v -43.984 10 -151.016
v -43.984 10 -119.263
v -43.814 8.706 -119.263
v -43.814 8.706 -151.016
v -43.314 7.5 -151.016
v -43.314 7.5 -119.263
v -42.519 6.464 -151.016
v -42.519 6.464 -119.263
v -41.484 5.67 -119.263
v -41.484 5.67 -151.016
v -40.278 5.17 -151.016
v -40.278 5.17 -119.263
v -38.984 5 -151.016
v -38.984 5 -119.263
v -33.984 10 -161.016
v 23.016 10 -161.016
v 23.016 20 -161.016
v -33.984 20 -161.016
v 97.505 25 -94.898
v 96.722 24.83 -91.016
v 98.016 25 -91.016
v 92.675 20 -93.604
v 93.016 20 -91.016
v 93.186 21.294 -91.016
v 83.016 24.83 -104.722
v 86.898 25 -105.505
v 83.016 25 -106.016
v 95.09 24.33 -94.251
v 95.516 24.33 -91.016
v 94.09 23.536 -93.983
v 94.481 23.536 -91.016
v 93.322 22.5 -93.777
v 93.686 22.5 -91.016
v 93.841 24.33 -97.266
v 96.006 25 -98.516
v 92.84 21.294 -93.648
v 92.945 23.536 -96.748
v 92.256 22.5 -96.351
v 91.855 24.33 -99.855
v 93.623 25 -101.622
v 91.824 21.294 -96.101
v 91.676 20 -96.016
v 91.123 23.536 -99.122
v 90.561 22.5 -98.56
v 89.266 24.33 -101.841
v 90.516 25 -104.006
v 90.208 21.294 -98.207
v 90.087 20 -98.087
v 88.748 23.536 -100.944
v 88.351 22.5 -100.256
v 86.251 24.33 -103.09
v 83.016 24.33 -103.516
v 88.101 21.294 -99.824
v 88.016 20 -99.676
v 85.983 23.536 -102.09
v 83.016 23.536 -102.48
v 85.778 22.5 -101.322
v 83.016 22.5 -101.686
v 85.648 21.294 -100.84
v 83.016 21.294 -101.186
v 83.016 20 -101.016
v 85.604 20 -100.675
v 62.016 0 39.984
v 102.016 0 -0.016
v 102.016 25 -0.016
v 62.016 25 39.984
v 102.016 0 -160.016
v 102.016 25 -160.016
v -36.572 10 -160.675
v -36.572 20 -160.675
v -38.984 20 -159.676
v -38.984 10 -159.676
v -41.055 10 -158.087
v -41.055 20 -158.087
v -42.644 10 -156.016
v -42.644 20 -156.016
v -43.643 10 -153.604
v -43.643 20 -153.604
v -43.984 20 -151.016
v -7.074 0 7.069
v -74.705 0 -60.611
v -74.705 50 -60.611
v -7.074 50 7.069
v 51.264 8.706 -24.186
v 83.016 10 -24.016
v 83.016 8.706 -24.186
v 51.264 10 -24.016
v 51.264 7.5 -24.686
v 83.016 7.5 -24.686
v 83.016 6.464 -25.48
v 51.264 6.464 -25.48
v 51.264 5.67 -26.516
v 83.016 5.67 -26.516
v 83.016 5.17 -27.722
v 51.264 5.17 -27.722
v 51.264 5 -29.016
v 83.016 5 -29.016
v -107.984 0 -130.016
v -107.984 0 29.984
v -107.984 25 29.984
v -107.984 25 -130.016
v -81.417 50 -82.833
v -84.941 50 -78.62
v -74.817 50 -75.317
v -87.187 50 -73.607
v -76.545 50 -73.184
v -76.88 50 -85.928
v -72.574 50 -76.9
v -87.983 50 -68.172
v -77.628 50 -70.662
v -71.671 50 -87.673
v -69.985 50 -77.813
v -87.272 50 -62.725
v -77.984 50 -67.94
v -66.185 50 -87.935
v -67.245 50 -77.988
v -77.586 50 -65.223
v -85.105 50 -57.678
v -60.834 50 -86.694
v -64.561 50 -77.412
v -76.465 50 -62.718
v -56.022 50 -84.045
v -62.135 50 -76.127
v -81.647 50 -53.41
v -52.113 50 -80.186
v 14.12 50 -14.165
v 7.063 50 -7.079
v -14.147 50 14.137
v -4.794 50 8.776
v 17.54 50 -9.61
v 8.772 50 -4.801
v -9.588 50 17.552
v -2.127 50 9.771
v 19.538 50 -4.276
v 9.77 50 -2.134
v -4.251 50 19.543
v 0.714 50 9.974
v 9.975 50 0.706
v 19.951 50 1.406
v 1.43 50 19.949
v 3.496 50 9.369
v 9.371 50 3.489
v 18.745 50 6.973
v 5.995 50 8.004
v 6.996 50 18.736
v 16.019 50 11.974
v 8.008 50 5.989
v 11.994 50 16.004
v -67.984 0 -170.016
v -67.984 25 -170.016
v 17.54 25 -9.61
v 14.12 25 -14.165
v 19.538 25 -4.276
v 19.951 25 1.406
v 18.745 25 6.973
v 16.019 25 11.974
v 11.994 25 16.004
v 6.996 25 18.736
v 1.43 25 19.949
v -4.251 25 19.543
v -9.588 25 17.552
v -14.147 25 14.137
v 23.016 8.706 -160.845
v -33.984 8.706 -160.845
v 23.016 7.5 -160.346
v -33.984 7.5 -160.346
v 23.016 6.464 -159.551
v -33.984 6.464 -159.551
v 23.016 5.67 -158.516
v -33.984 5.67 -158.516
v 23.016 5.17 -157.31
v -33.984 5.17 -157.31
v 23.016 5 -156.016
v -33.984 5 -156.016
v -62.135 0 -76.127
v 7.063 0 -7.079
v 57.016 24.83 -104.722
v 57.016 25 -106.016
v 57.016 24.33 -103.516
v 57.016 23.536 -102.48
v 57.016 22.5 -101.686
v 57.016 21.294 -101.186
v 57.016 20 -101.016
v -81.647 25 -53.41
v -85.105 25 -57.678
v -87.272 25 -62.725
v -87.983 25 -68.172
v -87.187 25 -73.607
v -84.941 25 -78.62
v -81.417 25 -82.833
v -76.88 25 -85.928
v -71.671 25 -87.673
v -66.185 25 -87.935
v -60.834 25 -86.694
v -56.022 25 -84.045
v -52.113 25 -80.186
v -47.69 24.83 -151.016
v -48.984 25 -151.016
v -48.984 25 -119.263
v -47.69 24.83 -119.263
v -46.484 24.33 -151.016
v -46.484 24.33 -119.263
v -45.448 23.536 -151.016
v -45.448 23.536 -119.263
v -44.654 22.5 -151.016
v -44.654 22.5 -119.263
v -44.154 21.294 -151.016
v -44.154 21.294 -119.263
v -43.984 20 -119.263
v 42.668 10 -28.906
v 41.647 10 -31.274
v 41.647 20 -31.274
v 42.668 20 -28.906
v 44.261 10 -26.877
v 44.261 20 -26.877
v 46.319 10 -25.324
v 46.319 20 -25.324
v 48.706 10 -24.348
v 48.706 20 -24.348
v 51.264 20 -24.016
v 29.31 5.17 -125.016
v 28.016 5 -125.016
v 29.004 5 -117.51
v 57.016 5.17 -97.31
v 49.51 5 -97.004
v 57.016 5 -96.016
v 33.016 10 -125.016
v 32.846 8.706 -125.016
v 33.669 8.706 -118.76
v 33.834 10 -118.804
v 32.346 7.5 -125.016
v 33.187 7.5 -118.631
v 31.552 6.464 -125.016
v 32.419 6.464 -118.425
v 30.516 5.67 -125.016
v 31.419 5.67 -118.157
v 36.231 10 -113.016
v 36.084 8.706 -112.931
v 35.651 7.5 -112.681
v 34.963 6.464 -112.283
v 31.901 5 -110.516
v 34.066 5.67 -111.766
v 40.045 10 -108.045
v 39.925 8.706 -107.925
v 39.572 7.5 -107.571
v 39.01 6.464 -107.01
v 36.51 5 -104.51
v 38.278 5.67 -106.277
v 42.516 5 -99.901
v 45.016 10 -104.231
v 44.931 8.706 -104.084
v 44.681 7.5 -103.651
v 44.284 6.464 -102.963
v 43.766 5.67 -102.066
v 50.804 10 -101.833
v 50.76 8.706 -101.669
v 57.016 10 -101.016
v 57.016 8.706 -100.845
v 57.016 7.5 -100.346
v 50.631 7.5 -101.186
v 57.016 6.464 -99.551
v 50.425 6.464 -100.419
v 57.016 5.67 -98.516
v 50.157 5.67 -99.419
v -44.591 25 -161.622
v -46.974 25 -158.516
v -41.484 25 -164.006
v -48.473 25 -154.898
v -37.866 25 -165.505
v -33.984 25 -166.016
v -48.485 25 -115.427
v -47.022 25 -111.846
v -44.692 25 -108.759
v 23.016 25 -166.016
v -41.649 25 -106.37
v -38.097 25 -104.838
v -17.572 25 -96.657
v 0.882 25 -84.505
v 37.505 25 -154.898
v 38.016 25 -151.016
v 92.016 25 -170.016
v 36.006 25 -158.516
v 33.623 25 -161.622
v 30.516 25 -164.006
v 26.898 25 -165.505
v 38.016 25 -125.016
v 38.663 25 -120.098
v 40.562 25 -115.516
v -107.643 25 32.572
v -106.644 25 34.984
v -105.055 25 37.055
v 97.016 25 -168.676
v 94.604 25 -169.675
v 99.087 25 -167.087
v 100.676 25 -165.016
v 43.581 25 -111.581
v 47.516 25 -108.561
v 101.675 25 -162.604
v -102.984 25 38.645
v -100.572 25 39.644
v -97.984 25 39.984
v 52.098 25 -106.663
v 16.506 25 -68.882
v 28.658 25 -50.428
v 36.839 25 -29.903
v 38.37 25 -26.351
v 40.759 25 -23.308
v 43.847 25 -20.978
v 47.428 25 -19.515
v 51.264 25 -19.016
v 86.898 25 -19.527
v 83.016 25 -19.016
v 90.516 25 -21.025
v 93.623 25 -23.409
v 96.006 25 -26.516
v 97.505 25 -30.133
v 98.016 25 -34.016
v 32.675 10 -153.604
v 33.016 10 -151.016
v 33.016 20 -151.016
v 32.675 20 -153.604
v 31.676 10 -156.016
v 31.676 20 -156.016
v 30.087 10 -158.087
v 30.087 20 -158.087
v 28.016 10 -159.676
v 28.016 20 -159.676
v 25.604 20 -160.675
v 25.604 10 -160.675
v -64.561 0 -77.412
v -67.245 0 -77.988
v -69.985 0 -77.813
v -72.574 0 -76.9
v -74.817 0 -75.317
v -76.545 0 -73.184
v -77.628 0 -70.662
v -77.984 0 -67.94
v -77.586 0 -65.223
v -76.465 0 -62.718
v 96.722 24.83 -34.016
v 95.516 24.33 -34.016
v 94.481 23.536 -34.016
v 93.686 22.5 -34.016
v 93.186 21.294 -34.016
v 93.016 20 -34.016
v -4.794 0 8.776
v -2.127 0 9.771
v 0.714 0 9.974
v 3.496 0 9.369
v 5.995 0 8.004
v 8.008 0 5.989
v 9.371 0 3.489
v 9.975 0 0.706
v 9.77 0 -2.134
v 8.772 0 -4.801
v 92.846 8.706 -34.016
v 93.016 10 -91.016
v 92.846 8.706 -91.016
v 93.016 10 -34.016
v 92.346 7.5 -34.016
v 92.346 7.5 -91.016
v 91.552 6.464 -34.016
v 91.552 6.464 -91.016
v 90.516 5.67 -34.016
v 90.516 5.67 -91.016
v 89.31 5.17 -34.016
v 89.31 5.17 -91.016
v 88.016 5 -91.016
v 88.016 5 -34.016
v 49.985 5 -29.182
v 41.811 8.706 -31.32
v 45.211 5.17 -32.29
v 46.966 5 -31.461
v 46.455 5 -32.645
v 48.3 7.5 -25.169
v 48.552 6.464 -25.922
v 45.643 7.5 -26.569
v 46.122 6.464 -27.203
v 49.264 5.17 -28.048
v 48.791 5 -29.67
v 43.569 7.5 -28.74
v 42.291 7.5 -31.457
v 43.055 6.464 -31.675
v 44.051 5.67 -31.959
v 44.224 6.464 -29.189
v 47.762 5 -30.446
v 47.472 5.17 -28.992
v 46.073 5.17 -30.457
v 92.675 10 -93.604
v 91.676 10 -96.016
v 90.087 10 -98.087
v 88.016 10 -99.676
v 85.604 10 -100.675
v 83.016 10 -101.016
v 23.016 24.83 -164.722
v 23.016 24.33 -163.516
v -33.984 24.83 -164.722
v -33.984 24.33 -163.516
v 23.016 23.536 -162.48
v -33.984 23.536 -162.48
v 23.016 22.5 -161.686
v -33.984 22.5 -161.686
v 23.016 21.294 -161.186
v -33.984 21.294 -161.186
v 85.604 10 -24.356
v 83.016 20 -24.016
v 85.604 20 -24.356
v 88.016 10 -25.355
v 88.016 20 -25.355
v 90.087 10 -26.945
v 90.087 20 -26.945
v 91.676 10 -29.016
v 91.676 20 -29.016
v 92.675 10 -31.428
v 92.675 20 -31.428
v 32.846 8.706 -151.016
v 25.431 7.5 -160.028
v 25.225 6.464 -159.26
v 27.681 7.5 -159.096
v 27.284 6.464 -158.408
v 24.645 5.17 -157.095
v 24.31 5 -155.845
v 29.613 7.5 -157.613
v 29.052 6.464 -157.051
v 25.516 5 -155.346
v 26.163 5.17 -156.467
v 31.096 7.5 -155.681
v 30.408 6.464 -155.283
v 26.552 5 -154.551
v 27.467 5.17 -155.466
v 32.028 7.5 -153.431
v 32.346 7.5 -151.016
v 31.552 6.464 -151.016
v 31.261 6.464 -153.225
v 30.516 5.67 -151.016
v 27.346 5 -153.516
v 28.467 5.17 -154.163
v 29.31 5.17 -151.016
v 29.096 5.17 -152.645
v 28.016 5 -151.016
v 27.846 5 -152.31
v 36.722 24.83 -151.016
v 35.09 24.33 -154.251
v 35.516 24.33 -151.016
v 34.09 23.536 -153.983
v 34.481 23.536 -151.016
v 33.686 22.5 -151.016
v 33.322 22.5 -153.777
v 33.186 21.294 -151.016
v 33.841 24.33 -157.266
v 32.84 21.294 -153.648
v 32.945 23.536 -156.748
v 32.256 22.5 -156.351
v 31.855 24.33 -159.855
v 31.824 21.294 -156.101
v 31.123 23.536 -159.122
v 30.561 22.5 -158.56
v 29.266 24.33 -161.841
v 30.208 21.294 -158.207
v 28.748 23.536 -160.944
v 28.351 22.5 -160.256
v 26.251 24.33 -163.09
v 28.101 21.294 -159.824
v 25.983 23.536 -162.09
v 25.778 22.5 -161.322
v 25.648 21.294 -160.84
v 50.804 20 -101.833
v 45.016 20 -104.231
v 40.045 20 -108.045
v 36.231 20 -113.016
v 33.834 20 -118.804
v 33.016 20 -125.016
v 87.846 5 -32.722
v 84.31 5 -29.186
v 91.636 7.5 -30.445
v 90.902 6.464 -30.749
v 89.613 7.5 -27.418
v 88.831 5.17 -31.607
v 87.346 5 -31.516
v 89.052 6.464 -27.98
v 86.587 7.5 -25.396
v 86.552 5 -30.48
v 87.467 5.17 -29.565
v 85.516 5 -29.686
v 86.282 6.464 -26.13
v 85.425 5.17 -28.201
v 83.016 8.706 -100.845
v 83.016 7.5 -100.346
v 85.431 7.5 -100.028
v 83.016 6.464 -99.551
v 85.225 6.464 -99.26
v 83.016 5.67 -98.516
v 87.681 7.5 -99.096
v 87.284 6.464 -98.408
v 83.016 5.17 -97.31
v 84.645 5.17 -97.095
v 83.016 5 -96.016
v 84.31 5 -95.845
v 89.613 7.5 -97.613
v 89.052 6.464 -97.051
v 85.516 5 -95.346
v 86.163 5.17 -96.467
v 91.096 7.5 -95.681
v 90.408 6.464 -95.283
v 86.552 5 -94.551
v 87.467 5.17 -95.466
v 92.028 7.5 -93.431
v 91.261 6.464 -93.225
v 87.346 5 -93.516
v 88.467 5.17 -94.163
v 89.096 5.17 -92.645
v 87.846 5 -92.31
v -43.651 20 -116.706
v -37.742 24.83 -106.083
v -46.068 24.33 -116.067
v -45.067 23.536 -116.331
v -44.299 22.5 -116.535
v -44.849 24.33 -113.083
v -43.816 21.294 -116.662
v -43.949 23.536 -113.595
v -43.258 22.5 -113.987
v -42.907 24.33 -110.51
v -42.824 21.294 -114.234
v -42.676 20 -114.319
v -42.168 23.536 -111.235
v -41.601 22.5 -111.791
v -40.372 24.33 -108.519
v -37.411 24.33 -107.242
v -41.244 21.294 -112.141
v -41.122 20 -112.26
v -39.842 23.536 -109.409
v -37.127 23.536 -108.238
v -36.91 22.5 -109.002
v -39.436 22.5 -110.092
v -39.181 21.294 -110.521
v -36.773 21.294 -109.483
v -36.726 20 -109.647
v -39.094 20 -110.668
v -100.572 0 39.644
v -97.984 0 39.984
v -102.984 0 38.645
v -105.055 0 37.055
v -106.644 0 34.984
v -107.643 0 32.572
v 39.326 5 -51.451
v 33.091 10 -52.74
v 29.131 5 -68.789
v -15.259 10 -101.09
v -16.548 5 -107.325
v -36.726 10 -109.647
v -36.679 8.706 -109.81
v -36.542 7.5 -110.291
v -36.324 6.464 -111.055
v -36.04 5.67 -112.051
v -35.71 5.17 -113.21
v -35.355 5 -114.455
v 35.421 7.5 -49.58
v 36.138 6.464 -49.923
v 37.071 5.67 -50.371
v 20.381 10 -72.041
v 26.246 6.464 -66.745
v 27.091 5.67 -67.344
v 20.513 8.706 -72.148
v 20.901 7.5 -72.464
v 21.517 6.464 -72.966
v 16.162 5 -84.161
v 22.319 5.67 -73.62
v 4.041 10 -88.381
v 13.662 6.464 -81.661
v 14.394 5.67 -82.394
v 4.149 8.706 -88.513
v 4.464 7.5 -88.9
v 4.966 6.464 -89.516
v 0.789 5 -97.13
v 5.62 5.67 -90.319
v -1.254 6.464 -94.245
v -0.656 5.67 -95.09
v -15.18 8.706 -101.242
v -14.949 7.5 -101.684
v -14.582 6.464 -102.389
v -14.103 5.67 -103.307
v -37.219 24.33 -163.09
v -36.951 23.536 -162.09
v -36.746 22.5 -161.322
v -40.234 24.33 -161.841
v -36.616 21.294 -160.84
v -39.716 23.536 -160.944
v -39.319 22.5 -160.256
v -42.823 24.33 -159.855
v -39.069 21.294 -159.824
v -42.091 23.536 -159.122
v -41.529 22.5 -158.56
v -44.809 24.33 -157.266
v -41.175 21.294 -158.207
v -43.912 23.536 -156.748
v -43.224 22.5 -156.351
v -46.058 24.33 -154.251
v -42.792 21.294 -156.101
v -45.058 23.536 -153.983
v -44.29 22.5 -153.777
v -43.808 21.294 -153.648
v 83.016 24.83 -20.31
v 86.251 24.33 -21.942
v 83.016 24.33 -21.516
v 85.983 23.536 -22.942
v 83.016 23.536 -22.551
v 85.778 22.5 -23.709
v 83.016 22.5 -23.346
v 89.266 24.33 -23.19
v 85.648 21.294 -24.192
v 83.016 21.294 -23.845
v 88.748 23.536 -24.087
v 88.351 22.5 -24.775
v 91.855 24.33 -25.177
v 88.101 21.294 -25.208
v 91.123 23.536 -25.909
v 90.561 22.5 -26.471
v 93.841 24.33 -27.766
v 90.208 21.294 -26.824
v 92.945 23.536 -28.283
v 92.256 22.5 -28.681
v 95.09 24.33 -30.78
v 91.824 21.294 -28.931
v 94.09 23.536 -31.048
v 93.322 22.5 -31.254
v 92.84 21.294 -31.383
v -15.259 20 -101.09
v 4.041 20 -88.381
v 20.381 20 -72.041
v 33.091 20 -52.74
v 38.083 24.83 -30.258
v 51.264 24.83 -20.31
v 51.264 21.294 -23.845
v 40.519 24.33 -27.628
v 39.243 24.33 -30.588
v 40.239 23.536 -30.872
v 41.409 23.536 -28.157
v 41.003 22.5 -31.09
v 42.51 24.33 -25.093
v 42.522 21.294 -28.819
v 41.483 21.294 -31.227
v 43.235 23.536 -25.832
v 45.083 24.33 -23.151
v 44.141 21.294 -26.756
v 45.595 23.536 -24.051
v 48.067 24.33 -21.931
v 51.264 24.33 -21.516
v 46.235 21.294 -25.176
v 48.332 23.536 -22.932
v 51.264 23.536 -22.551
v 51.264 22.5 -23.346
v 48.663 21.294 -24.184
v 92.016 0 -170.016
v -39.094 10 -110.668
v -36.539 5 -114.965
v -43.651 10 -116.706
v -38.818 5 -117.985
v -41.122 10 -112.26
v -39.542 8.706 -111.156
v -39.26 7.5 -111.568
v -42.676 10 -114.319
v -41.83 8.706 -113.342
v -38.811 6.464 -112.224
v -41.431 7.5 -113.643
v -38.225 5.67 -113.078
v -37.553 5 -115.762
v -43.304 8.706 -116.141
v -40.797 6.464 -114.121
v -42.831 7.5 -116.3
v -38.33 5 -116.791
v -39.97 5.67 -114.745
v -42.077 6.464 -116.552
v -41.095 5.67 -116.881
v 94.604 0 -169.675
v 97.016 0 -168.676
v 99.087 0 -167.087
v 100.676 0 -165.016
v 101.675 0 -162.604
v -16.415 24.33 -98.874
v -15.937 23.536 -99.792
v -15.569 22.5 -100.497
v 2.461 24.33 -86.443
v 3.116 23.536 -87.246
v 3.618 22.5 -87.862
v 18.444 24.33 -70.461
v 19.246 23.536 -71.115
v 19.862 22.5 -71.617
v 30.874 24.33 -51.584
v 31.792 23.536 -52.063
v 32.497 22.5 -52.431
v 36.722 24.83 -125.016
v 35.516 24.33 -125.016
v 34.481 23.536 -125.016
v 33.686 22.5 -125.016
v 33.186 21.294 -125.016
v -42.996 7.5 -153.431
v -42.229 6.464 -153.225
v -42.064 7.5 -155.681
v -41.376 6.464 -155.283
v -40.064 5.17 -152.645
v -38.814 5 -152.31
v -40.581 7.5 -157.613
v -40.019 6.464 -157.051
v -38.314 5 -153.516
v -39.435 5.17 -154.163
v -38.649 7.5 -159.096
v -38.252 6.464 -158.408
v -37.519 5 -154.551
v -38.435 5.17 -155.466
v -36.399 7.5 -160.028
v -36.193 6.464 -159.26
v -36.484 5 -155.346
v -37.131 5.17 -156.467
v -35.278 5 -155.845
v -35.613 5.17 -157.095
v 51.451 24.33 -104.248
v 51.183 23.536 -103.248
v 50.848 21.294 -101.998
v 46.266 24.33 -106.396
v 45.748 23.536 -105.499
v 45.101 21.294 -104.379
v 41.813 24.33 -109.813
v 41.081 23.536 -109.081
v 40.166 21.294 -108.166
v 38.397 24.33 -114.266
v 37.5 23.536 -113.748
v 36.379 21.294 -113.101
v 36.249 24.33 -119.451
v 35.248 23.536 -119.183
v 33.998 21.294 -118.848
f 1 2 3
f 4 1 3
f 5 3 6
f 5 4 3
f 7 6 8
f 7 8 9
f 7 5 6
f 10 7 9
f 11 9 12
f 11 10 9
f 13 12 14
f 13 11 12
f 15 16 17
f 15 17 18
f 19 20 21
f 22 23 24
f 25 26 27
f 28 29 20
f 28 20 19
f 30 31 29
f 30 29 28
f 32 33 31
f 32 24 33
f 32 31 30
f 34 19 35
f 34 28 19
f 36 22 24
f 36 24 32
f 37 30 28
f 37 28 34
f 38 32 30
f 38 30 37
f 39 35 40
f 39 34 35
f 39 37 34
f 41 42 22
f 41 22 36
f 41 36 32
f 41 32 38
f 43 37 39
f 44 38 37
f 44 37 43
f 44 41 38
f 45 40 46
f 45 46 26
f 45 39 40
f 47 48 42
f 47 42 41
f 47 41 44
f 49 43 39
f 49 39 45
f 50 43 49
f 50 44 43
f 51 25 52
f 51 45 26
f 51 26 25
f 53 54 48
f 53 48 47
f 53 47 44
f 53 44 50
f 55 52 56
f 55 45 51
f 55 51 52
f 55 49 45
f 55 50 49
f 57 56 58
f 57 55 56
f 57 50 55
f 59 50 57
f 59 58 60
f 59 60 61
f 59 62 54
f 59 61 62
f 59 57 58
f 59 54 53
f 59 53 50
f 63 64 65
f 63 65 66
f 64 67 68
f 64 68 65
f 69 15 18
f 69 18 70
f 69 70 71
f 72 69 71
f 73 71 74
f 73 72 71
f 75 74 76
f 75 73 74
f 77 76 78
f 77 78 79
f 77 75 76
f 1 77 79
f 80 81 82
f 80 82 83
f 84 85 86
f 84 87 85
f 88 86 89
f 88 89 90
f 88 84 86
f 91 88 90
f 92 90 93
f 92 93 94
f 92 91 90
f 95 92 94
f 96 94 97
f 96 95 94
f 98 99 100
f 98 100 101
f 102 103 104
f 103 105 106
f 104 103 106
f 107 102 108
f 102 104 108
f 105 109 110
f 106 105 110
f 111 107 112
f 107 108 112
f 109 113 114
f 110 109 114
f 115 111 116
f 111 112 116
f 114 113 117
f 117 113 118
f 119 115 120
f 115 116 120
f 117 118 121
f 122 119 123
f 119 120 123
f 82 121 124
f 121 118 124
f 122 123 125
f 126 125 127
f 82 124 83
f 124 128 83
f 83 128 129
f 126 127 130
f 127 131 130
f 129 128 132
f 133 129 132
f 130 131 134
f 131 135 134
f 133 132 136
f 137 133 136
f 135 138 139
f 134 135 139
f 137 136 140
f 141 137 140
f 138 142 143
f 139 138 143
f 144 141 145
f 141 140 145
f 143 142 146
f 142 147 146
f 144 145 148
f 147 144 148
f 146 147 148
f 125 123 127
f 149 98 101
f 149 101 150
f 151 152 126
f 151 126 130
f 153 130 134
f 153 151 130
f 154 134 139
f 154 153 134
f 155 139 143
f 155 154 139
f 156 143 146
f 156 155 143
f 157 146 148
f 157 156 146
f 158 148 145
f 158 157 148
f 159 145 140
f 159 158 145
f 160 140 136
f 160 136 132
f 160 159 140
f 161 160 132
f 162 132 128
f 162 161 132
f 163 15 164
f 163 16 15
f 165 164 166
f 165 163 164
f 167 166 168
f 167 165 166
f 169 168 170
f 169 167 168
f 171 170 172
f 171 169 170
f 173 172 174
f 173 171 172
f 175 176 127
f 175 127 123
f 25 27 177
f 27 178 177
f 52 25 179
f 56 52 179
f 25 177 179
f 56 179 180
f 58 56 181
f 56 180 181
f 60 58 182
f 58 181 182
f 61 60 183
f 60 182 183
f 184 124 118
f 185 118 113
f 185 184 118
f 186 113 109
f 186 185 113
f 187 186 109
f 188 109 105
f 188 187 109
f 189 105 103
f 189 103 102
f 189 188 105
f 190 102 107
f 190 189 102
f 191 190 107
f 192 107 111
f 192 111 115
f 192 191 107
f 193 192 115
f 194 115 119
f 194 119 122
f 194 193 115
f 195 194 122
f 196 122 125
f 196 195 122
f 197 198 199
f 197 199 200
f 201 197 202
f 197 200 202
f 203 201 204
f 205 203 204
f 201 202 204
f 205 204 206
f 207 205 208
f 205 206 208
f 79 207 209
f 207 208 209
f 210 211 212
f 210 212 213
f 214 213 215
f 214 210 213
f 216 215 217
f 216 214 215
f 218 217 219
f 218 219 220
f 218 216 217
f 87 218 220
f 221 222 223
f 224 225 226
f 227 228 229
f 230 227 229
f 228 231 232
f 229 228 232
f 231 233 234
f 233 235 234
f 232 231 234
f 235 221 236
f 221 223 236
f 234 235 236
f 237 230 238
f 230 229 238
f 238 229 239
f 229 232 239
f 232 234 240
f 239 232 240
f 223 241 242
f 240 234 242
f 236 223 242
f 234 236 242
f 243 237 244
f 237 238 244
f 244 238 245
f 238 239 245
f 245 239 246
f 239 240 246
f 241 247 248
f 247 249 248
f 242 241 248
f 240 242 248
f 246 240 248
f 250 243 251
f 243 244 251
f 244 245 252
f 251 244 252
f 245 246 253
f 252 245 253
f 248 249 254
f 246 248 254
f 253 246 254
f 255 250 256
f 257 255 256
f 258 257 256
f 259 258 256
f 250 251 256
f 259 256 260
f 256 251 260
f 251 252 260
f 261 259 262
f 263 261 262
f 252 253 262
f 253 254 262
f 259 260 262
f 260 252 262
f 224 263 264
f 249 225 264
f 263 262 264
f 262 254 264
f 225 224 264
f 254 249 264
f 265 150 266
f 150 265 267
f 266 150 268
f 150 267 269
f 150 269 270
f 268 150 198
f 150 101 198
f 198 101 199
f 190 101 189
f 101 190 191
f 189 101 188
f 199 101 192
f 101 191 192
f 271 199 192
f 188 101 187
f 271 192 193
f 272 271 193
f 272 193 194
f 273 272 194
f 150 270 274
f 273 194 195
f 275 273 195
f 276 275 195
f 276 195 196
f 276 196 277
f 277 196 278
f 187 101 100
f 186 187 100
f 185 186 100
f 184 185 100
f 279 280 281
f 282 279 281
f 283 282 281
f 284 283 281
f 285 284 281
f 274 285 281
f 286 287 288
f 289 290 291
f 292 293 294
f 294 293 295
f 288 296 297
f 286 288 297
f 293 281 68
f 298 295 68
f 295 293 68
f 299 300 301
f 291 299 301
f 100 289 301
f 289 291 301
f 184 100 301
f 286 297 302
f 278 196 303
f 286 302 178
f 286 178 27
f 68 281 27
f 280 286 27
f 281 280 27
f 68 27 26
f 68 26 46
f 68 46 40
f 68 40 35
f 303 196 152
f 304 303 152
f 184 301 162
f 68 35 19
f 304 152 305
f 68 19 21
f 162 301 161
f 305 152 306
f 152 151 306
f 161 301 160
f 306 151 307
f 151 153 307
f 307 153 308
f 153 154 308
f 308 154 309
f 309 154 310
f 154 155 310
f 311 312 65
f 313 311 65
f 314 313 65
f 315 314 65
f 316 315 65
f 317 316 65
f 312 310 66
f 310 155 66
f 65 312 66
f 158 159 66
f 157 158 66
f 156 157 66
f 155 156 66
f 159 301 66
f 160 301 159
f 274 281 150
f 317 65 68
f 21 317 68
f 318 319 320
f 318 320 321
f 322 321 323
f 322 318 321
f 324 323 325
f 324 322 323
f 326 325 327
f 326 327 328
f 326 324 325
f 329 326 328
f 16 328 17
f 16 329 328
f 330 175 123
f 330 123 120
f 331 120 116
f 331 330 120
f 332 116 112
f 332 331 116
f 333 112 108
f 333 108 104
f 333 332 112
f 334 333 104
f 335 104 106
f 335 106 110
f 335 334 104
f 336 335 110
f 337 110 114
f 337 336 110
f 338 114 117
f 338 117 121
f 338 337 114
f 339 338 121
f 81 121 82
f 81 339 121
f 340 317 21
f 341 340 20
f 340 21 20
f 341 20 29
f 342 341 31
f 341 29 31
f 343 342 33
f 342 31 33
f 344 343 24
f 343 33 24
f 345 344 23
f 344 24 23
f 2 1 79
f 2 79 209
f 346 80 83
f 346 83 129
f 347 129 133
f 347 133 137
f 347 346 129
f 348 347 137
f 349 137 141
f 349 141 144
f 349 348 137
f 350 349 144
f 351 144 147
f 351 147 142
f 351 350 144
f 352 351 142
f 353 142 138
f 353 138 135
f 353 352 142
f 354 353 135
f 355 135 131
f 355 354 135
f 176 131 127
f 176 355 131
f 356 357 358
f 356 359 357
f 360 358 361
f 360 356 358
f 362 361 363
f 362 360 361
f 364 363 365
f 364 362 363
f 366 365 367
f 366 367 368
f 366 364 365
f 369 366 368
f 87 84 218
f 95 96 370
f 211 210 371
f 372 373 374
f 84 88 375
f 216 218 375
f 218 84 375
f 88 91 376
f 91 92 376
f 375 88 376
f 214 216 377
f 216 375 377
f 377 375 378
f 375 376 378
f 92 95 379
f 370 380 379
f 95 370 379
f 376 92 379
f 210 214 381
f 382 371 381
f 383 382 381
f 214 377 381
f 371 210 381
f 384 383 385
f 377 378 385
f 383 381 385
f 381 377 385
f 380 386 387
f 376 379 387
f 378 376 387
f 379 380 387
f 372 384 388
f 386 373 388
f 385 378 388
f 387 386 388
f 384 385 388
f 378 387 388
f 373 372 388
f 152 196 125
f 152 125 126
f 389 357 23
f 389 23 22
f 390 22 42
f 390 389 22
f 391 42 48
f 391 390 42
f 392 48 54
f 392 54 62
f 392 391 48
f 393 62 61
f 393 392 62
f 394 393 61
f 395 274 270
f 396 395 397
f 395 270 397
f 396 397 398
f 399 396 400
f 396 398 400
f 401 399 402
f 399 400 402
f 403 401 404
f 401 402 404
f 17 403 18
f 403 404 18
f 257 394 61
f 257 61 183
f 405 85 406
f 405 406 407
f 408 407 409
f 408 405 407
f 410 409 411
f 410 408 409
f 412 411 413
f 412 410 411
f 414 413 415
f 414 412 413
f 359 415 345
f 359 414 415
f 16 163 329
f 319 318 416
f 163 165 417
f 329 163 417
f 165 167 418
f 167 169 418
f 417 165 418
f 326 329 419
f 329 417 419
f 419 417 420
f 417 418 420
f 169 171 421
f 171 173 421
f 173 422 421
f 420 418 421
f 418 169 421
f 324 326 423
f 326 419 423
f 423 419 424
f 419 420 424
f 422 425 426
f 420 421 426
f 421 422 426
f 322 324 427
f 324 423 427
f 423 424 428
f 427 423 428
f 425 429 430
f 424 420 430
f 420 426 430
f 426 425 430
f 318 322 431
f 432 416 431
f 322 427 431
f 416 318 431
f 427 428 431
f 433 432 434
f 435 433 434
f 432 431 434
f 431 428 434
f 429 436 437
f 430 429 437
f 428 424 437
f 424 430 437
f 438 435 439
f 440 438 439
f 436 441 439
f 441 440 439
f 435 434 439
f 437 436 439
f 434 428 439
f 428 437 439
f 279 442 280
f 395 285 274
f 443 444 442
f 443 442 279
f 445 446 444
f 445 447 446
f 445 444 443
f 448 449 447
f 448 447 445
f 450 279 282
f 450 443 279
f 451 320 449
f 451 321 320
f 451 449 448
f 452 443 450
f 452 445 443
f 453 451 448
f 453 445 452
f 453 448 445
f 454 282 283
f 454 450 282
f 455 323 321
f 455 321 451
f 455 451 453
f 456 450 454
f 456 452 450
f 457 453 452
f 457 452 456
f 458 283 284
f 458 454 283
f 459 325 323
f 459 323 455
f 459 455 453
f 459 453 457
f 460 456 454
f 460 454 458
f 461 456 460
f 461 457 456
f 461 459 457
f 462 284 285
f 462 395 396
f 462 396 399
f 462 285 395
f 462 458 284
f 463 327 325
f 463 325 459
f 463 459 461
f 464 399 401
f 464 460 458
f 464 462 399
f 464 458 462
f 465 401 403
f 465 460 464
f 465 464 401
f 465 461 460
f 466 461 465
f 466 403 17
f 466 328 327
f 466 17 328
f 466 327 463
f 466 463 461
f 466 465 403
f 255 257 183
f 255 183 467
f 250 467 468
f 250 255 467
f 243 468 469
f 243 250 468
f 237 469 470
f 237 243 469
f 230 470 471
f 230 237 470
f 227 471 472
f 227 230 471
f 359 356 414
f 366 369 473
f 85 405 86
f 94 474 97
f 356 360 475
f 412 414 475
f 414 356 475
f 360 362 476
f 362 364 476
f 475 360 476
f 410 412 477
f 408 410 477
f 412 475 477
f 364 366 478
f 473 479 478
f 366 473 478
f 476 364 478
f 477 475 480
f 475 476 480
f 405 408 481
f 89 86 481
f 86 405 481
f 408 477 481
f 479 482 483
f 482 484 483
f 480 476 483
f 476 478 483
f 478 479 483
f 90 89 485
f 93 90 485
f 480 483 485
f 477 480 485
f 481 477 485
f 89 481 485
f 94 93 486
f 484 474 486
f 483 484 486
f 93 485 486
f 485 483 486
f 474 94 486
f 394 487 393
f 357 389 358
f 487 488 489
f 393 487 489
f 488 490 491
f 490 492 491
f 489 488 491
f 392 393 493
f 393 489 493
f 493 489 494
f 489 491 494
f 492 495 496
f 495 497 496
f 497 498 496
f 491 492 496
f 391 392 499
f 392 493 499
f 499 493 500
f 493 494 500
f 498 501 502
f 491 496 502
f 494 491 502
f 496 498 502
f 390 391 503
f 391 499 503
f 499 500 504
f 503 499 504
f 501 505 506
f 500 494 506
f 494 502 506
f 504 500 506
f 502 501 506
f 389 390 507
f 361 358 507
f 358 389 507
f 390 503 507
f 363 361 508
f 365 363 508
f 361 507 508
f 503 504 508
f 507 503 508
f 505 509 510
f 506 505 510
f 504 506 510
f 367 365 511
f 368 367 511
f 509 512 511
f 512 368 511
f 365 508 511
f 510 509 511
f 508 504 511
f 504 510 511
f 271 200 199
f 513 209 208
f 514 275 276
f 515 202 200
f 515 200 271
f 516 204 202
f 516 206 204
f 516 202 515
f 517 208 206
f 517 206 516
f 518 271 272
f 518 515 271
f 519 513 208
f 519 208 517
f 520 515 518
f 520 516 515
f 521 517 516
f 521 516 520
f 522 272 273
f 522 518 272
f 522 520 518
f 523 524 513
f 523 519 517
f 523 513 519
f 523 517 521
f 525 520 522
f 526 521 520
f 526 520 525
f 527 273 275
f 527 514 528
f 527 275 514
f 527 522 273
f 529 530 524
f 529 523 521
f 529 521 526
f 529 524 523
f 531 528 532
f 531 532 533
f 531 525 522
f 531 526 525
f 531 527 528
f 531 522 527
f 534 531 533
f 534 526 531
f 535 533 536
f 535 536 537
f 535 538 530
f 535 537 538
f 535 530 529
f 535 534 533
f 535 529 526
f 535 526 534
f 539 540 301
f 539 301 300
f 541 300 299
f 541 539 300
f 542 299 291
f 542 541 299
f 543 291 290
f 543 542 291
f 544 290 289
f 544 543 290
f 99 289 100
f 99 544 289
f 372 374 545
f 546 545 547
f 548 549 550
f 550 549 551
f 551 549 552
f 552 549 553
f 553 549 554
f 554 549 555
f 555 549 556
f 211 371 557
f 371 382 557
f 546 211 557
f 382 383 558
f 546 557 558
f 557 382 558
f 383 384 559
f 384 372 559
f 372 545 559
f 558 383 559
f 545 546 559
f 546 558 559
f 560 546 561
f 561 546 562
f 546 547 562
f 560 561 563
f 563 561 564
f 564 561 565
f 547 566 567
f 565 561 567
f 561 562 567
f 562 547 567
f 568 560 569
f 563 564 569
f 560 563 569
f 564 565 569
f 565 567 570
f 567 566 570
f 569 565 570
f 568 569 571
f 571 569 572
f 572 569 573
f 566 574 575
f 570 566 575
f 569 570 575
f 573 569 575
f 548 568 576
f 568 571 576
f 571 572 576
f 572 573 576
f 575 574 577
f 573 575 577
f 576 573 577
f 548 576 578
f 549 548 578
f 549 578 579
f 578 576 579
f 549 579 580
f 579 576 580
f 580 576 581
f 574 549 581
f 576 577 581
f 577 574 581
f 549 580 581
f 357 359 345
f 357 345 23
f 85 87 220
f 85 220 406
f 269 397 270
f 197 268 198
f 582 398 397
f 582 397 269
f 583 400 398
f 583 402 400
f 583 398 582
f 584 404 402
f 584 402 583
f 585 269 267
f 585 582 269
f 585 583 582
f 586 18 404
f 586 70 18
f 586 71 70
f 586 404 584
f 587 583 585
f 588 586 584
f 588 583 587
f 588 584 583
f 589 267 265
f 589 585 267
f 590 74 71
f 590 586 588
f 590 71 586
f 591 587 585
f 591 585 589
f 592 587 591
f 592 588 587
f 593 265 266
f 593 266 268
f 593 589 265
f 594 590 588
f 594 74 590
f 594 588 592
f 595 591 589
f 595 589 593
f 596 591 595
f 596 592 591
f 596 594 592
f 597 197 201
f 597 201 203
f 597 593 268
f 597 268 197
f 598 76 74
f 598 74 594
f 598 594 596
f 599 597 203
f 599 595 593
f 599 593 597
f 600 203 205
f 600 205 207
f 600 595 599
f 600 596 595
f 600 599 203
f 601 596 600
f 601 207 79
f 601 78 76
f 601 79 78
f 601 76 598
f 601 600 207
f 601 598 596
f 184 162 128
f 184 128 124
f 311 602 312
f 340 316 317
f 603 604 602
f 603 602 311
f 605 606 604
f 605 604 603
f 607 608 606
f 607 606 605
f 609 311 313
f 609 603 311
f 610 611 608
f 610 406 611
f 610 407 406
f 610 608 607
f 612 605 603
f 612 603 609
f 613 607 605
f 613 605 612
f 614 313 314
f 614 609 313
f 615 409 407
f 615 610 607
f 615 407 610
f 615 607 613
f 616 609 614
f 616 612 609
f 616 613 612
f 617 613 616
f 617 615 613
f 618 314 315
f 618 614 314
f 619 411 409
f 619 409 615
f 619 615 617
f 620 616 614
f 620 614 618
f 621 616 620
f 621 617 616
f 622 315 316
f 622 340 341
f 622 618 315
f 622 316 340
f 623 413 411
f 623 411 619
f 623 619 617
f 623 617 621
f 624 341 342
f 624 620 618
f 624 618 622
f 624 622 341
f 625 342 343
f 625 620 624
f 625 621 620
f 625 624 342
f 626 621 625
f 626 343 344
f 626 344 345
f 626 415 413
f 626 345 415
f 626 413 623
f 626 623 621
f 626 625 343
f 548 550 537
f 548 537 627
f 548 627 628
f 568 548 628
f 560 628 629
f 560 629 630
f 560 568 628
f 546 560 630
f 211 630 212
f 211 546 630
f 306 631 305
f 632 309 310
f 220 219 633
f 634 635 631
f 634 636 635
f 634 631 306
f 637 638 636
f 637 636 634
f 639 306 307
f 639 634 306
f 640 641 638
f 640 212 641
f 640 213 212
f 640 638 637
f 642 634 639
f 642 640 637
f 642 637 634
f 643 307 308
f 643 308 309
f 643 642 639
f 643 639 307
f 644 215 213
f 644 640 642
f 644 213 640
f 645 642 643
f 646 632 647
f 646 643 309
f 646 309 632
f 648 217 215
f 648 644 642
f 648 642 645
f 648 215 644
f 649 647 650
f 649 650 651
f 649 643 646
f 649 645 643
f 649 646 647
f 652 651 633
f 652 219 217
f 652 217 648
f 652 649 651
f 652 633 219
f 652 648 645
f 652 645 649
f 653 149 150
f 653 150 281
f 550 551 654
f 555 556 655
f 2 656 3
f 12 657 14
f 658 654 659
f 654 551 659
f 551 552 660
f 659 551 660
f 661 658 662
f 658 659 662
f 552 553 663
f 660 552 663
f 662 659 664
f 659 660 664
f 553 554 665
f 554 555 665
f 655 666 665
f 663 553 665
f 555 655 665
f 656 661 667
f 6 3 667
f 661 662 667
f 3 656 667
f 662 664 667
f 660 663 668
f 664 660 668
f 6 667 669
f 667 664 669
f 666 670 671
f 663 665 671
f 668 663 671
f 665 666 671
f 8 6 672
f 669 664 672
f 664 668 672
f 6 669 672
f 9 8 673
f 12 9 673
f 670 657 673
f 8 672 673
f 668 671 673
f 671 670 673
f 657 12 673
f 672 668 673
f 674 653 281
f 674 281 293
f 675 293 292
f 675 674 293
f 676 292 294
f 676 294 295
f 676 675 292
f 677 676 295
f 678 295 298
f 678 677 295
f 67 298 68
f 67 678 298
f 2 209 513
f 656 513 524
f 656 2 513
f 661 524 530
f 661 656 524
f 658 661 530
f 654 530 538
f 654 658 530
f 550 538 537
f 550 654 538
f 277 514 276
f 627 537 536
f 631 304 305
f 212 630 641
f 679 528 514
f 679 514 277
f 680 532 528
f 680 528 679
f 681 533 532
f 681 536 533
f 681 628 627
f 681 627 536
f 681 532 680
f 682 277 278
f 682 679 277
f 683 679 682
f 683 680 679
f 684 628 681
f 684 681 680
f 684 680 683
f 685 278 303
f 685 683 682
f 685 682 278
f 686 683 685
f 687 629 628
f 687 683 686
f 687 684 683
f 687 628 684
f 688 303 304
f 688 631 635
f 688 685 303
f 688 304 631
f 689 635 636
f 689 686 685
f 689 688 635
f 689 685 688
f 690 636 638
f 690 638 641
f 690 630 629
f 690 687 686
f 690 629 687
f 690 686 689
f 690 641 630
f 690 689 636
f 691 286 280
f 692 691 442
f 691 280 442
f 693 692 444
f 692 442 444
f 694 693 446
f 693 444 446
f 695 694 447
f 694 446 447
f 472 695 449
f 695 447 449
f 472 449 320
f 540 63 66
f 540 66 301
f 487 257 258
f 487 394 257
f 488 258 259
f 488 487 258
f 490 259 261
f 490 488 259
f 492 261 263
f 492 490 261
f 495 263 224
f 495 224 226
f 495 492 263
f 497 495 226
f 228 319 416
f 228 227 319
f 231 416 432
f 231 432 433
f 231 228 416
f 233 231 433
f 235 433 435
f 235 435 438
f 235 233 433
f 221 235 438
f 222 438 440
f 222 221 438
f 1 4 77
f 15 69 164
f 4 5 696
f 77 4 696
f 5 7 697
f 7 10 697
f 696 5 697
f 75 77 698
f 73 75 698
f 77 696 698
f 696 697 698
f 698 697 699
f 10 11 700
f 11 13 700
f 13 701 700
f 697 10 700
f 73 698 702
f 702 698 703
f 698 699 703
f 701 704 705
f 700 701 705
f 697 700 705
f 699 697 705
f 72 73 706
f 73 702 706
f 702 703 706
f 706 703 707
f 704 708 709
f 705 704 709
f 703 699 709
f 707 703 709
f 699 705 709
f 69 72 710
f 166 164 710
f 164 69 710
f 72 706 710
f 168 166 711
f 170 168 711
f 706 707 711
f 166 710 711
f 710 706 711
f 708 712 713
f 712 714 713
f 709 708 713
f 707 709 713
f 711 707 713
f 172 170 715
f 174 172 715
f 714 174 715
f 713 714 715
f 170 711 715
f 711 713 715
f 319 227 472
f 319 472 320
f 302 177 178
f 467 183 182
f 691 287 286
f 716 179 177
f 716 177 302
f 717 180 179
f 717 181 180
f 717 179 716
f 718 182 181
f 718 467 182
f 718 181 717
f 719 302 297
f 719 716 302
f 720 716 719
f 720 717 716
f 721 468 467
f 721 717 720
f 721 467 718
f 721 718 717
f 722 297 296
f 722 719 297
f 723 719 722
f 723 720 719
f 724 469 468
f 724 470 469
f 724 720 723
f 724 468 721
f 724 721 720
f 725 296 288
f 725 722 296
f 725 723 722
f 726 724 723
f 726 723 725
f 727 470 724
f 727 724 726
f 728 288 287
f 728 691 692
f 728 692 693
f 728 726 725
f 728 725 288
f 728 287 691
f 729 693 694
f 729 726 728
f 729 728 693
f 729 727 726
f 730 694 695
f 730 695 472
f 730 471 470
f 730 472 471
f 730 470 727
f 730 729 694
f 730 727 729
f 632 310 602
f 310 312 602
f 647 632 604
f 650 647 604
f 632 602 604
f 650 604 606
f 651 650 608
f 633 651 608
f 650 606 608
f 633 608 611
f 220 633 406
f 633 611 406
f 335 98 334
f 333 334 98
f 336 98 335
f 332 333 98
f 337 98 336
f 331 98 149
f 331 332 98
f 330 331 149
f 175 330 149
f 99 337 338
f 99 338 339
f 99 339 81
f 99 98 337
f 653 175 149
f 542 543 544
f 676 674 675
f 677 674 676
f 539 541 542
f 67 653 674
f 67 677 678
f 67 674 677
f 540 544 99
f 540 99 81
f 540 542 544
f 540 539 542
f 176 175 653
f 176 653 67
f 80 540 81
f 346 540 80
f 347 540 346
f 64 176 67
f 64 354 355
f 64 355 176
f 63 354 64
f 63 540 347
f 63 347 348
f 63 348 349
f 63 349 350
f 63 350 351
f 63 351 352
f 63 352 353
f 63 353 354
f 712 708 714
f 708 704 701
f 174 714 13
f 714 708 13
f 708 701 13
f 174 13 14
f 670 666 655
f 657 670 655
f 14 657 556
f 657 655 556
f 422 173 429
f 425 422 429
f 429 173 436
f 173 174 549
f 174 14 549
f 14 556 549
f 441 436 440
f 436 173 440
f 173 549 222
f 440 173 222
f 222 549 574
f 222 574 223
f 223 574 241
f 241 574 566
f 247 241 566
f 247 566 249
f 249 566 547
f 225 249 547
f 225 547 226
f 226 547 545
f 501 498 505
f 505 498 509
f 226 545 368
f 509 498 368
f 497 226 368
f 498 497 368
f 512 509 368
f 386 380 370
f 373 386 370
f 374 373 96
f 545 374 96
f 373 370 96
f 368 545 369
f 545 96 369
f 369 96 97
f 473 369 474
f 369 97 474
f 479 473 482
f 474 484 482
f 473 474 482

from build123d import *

# Parameters (mm, degrees)
F1_DEPTH = 50
F2_DEPTH = 25
F4_DEPTH = 5
F5_R     = 5


with BuildPart() as f1:
    # F0 (on Front) → F1 (new body)
    with BuildSketch(Plane.XZ):
        with BuildLine():
            Line((-14.1471050896, 14.137164411), (-81.6470713128, -53.4102650408))
            ThreePointArc((-81.6470713128, -53.4102650408), (-81.4172585272, -82.8327909518), (-52.1131197981, -80.1860385553))
            Line((-52.1131197981, -80.1860385553), (14.1195211891, -14.1647139537))
            ThreePointArc((14.1195211891, -14.1647139537), (14.1509459034, 14.133319852), (-14.1471050896, 14.137164411))
        make_face()
        with BuildLine():
            ThreePointArc((-7.0735915388, 7.0685431839), (7.0736510846, 7.068483595), (7.0633719628, -7.0787552942))
            Line((7.0633719628, -7.0787552942), (-62.1351958298, -76.1269429069))
            ThreePointArc((-62.1351958298, -76.1269429069), (-75.7541474378, -74.3104584003), (-74.7048583437, -60.6110258843))
            Line((-74.7048583437, -60.6110258843), (-7.0735915388, 7.0685431839))
        make_face(mode=Mode.SUBTRACT)
    extrude(amount=-F1_DEPTH)

    # F0 (on Front) → F2 (join)
    with BuildSketch(Plane.XZ):
        with BuildLine():
            Line((102.0160578582, -0.0157058509), (62.0160578582, 39.9842941491))
            Line((62.0160578582, 39.9842941491), (-97.9839421418, 39.9842941491))
            ThreePointArc((-97.9839421418, 39.9842941491), (-105.0550099537, 37.055361961), (-107.9839421418, 29.9842941491))
            Line((-107.9839421418, 29.9842941491), (-107.9839421418, -130.0157058509))
            Line((-107.9839421418, -130.0157058509), (-67.9839421418, -170.0157058509))
            Line((-67.9839421418, -170.0157058509), (92.0160578582, -170.0157058509))
            ThreePointArc((92.0160578582, -170.0157058509), (99.0871256701, -167.0867736627), (102.0160578582, -160.0157058509))
            Line((102.0160578582, -160.0157058509), (102.0160578582, -0.0157058509))
        make_face()
        with BuildLine():
            ThreePointArc((93.0160578582, -91.0157058509), (90.0871256701, -98.0867736627), (83.0160578582, -101.0157058509))
            Line((83.0160578582, -101.0157058509), (57.0160578582, -101.0157058509))
            ThreePointArc((57.0160578582, -101.0157058509), (40.0454951097, -108.0451431024), (33.0160578582, -125.0157058509))
            Line((33.0160578582, -125.0157058509), (33.0160578582, -151.0157058509))
            ThreePointArc((33.0160578582, -151.0157058509), (30.0871256701, -158.0867736627), (23.0160578582, -161.0157058509))
            Line((23.0160578582, -161.0157058509), (-33.9839421418, -161.0157058509))
            ThreePointArc((-33.9839421418, -161.0157058509), (-41.0550099537, -158.0867736627), (-43.9839421418, -151.0157058509))
            Line((-43.9839421418, -151.0157058509), (-43.9839421418, -119.263347337))
            ThreePointArc((-43.9839421418, -119.263347337), (-41.9657763558, -113.2392023702), (-36.7258776257, -109.6466020559))
            ThreePointArc((-36.7258776257, -109.6466020559), (12.6262309135, -80.6258789061), (41.6469540632, -31.273770367))
            ThreePointArc((41.6469540632, -31.273770367), (45.2395543775, -26.0338716369), (51.2636993443, -24.0157058509))
            Line((51.2636993443, -24.0157058509), (83.0160578582, -24.0157058509))
            ThreePointArc((83.0160578582, -24.0157058509), (90.0871256701, -26.944638039), (93.0160578582, -34.0157058509))
            Line((93.0160578582, -34.0157058509), (93.0160578582, -91.0157058509))
        make_face(mode=Mode.SUBTRACT)
        with BuildLine():
            ThreePointArc((-52.1131197981, -80.1860385553), (-81.4172585272, -82.8327909518), (-81.6470713128, -53.4102650408))
            Line((-81.6470713128, -53.4102650408), (-14.1471050896, 14.137164411))
            ThreePointArc((-14.1471050896, 14.137164411), (14.1509459034, 14.133319852), (14.1195211891, -14.1647139537))
            Line((14.1195211891, -14.1647139537), (-52.1131197981, -80.1860385553))
        make_face(mode=Mode.SUBTRACT)
    extrude(amount=-F2_DEPTH)

    # F3 (on face) → F4 (join)
    with BuildSketch(Plane.XZ):
        with BuildLine():
            ThreePointArc((51.2636993443, -24.0157058509), (45.2395543775, -26.0338716369), (41.6469540632, -31.273770367))
            ThreePointArc((41.6469540632, -31.273770367), (12.6262309135, -80.6258789061), (-36.7258776257, -109.6466020559))
            ThreePointArc((-36.7258776257, -109.6466020559), (-41.9657763558, -113.2392023702), (-43.9839421418, -119.263347337))
            Line((-43.9839421418, -119.263347337), (-43.9839421418, -151.0157058509))
            ThreePointArc((-43.9839421418, -151.0157058509), (-41.0550099537, -158.0867736627), (-33.9839421418, -161.0157058509))
            Line((-33.9839421418, -161.0157058509), (23.0160578582, -161.0157058509))
            ThreePointArc((23.0160578582, -161.0157058509), (30.0871256701, -158.0867736627), (33.0160578582, -151.0157058509))
            Line((33.0160578582, -151.0157058509), (33.0160578582, -125.0157058509))
            ThreePointArc((33.0160578582, -125.0157058509), (40.0454951097, -108.0451431024), (57.0160578582, -101.0157058509))
            Line((57.0160578582, -101.0157058509), (83.0160578582, -101.0157058509))
            ThreePointArc((83.0160578582, -101.0157058509), (90.0871256701, -98.0867736627), (93.0160578582, -91.0157058509))
            Line((93.0160578582, -91.0157058509), (93.0160578582, -34.0157058509))
            ThreePointArc((93.0160578582, -34.0157058509), (90.0871256701, -26.944638039), (83.0160578582, -24.0157058509))
            Line((83.0160578582, -24.0157058509), (51.2636993443, -24.0157058509))
        make_face()
    extrude(amount=-F4_DEPTH)

    # F5
    f5_edges = [f1.edges().sort_by_distance(p)[0] for p in [
        (67.139879, 5, -24.015706),
        (83.016058, 15, -24.015706),
        (67.139879, 25, -24.015706),
        (51.263699, 15, -24.015706),
        (45.239554, 5, -26.033872),
        (12.626231, 5, -80.625879),
        (-41.965776, 5, -113.239202),
        (-43.983942, 5, -135.139527),
        (-41.05501, 5, -158.086774),
        (-5.483942, 5, -161.015706),
        (30.087126, 5, -158.086774),
        (33.016058, 5, -138.015706),
        (40.045495, 5, -108.045143),
        (70.016058, 5, -101.015706),
        (90.087126, 5, -98.086774),
        (93.016058, 5, -62.515706),
        (90.087126, 5, -26.944638),
    ]]
    fillet(f5_edges, radius=F5_R)


solid = f1.part
